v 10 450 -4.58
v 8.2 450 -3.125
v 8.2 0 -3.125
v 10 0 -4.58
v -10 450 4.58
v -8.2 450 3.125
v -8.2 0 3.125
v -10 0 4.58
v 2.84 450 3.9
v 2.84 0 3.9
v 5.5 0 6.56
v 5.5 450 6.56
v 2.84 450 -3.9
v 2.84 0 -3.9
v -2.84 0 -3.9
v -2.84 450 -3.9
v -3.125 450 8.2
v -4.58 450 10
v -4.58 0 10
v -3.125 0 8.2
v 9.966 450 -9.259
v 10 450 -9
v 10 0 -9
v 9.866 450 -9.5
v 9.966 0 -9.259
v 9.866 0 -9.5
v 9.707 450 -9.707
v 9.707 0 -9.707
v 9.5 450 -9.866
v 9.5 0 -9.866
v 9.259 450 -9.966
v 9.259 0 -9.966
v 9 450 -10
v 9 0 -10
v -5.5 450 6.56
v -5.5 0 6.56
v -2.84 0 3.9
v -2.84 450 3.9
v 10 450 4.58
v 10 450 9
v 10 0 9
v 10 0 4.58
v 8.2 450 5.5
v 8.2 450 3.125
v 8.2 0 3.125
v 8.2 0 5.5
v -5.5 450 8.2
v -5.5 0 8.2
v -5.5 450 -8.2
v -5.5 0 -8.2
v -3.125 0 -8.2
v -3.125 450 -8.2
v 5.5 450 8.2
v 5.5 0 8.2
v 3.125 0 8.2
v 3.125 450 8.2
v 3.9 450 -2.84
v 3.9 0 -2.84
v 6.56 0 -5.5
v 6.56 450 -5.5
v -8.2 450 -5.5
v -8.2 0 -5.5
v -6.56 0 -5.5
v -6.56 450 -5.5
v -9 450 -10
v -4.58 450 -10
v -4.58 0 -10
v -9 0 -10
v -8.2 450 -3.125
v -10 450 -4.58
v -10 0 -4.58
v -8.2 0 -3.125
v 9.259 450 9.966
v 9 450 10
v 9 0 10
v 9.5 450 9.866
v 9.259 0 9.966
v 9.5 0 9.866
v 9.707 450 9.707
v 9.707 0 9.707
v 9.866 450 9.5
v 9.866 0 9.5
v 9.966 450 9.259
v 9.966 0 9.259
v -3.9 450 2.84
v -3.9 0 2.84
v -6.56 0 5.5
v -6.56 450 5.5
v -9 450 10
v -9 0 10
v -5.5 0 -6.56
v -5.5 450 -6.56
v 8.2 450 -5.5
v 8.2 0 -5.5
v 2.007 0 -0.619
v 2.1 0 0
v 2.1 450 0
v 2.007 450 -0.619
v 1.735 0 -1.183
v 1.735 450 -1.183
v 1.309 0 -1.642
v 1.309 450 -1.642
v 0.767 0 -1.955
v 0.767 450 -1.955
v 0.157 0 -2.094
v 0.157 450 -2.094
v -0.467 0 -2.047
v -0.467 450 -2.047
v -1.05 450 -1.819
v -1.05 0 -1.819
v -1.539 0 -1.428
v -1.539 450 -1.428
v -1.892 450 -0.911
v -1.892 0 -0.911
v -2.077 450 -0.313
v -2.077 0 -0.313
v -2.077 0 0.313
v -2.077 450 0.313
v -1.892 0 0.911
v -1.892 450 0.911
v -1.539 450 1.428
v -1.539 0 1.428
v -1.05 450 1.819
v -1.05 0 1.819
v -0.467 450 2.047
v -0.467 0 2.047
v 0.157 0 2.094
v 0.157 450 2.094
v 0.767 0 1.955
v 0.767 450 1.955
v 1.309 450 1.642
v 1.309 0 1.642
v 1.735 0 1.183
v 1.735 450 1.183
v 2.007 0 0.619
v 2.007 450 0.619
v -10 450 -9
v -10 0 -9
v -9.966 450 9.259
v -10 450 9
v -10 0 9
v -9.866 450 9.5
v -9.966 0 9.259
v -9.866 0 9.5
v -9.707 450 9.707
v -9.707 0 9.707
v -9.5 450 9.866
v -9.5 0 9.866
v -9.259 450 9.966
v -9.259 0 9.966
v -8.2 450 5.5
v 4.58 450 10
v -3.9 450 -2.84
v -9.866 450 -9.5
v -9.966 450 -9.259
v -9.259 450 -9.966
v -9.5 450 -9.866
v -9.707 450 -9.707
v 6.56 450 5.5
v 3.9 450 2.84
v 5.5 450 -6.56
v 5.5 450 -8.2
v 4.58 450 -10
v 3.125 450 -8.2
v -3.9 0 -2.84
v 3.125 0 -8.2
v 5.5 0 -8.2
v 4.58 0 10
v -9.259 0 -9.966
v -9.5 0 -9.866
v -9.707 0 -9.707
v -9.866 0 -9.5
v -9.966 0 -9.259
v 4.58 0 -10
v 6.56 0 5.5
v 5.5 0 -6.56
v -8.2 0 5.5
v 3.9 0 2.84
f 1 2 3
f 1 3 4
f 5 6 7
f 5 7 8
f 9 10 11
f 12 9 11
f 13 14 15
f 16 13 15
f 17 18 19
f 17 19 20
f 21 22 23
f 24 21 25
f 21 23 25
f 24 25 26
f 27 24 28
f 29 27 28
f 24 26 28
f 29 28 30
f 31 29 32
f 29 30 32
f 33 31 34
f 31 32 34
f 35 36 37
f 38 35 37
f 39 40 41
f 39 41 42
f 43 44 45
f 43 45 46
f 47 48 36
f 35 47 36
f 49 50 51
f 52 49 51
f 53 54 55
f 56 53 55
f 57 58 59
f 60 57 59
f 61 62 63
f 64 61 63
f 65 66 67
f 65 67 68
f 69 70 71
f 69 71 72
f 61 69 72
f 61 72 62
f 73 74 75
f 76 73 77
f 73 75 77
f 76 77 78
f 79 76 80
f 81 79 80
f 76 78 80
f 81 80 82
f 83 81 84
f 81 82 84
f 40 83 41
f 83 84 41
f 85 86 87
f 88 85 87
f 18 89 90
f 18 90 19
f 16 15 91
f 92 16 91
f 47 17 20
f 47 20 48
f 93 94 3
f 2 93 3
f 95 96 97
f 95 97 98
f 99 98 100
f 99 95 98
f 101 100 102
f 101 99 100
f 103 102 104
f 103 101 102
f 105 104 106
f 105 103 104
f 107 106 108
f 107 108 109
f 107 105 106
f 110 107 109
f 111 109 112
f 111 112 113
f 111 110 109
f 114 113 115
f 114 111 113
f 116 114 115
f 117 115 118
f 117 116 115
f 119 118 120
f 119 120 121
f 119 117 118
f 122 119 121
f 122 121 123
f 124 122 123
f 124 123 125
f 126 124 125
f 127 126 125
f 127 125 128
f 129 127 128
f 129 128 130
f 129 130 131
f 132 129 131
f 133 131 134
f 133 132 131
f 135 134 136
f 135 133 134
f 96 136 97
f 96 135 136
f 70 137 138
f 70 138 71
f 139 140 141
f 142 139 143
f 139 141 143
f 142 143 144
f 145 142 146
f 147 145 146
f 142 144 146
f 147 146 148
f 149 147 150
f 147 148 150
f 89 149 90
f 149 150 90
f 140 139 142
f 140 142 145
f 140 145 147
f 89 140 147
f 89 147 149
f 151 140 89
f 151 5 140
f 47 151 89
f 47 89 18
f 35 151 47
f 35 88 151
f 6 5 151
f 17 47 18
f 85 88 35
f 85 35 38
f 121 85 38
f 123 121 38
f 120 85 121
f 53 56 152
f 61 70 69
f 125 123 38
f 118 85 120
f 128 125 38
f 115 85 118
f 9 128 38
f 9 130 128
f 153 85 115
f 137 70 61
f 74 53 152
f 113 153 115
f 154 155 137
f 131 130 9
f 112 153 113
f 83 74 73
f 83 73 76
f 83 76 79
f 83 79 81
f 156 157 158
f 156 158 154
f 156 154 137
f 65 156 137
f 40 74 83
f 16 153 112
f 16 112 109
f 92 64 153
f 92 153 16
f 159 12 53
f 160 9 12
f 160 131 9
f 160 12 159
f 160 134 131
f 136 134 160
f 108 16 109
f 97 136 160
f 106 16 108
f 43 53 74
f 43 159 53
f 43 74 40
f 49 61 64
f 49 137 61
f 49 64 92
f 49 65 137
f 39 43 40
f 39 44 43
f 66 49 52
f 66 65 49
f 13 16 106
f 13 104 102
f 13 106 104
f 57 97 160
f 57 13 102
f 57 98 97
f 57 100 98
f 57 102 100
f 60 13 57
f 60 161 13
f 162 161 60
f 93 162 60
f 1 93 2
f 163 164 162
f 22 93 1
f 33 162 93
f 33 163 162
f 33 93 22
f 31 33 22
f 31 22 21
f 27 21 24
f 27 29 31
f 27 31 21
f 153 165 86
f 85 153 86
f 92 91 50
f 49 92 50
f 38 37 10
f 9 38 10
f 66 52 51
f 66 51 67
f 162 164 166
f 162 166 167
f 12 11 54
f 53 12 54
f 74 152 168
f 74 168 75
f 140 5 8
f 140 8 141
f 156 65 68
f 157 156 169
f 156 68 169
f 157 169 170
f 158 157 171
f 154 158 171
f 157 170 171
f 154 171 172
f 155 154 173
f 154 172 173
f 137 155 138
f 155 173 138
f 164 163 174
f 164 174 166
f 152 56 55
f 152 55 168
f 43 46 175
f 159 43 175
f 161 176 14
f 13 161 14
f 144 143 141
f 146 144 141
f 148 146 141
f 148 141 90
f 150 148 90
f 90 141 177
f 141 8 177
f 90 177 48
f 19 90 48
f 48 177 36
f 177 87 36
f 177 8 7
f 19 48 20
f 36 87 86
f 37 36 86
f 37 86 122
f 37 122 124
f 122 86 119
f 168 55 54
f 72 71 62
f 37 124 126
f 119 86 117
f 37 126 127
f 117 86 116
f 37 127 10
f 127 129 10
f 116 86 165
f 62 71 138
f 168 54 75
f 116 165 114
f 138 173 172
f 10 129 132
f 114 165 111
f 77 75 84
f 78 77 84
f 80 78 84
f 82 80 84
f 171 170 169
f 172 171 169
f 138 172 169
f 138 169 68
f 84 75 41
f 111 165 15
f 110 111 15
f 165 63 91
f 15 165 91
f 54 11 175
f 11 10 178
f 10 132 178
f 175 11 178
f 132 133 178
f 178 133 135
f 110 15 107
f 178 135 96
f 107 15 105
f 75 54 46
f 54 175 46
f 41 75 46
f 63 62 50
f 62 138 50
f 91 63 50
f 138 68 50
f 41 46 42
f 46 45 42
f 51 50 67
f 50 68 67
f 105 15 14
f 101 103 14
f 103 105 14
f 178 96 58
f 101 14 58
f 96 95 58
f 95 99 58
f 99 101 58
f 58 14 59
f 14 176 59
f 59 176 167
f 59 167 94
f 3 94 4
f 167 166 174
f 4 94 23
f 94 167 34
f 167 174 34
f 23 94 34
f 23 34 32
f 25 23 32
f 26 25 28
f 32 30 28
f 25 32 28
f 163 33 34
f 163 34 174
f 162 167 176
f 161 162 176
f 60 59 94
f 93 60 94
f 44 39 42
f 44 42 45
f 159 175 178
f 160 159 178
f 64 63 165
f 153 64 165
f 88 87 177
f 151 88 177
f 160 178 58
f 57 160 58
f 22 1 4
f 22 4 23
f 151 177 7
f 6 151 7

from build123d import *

# Parameters (mm, degrees)
SKETCH1_R           = 2.1
BOSS_EXTRUDE1_DEPTH = 450


with BuildPart() as part:
    # Sketch1 → Boss-Extrude1 (new body)
    with BuildSketch(Plane(origin=(0, 0, 0), x_dir=(1, 0, 0), z_dir=(0, 1, 0))):
        with BuildLine():
            Line((-5.5, 8.2), (-3.125, 8.2))
            Line((-3.125, 8.2), (-4.58, 10))
            Line((-4.58, 10), (-9, 10))
            ThreePointArc((-9, 10), (-9.707106781, 9.707106781), (-10, 9))
            Line((-10, 9), (-10, 4.58))
            Line((-10, 4.58), (-8.2, 3.125))
            Line((-8.2, 3.125), (-8.2, 5.5))
            Line((-8.2, 5.5), (-6.56, 5.5))
            Line((-6.56, 5.5), (-3.9, 2.84))
            Line((-3.9, 2.84), (-3.9, -2.84))
            Line((-3.9, -2.84), (-6.56, -5.5))
            Line((-6.56, -5.5), (-8.2, -5.5))
            Line((-8.2, -5.5), (-8.2, -3.125))
            Line((-8.2, -3.125), (-10, -4.58))
            Line((-10, -4.58), (-10, -9))
            ThreePointArc((-10, -9), (-9.707106781, -9.707106781), (-9, -10))
            Line((-9, -10), (-4.58, -10))
            Line((-4.58, -10), (-3.125, -8.2))
            Line((-3.125, -8.2), (-5.5, -8.2))
            Line((-5.5, -8.2), (-5.5, -6.56))
            Line((-5.5, -6.56), (-2.84, -3.9))
            Line((-2.84, -3.9), (2.84, -3.9))
            Line((2.84, -3.9), (5.5, -6.56))
            Line((5.5, -6.56), (5.5, -8.2))
            Line((5.5, -8.2), (3.125, -8.2))
            Line((3.125, -8.2), (4.58, -10))
            Line((4.58, -10), (9, -10))
            ThreePointArc((9, -10), (9.707106781, -9.707106781), (10, -9))
            Line((10, -9), (10, -4.58))
            Line((10, -4.58), (8.2, -3.125))
            Line((8.2, -3.125), (8.2, -5.5))
            Line((8.2, -5.5), (6.56, -5.5))
            Line((6.56, -5.5), (3.9, -2.84))
            Line((3.9, -2.84), (3.9, 2.84))
            Line((3.9, 2.84), (6.56, 5.5))
            Line((6.56, 5.5), (8.2, 5.5))
            Line((8.2, 5.5), (8.2, 3.125))
            Line((8.2, 3.125), (10, 4.58))
            Line((10, 4.58), (10, 9))
            ThreePointArc((10, 9), (9.707106781, 9.707106781), (9, 10))
            Line((9, 10), (4.58, 10))
            Line((4.58, 10), (3.125, 8.2))
            Line((3.125, 8.2), (5.5, 8.2))
            Line((5.5, 8.2), (5.5, 6.56))
            Line((5.5, 6.56), (2.84, 3.9))
            Line((2.84, 3.9), (-2.84, 3.9))
            Line((-2.84, 3.9), (-5.5, 6.56))
            Line((-5.5, 6.56), (-5.5, 8.2))
        make_face()
        Circle(SKETCH1_R, mode=Mode.SUBTRACT)
    extrude(amount=BOSS_EXTRUDE1_DEPTH)


solid = part.part
